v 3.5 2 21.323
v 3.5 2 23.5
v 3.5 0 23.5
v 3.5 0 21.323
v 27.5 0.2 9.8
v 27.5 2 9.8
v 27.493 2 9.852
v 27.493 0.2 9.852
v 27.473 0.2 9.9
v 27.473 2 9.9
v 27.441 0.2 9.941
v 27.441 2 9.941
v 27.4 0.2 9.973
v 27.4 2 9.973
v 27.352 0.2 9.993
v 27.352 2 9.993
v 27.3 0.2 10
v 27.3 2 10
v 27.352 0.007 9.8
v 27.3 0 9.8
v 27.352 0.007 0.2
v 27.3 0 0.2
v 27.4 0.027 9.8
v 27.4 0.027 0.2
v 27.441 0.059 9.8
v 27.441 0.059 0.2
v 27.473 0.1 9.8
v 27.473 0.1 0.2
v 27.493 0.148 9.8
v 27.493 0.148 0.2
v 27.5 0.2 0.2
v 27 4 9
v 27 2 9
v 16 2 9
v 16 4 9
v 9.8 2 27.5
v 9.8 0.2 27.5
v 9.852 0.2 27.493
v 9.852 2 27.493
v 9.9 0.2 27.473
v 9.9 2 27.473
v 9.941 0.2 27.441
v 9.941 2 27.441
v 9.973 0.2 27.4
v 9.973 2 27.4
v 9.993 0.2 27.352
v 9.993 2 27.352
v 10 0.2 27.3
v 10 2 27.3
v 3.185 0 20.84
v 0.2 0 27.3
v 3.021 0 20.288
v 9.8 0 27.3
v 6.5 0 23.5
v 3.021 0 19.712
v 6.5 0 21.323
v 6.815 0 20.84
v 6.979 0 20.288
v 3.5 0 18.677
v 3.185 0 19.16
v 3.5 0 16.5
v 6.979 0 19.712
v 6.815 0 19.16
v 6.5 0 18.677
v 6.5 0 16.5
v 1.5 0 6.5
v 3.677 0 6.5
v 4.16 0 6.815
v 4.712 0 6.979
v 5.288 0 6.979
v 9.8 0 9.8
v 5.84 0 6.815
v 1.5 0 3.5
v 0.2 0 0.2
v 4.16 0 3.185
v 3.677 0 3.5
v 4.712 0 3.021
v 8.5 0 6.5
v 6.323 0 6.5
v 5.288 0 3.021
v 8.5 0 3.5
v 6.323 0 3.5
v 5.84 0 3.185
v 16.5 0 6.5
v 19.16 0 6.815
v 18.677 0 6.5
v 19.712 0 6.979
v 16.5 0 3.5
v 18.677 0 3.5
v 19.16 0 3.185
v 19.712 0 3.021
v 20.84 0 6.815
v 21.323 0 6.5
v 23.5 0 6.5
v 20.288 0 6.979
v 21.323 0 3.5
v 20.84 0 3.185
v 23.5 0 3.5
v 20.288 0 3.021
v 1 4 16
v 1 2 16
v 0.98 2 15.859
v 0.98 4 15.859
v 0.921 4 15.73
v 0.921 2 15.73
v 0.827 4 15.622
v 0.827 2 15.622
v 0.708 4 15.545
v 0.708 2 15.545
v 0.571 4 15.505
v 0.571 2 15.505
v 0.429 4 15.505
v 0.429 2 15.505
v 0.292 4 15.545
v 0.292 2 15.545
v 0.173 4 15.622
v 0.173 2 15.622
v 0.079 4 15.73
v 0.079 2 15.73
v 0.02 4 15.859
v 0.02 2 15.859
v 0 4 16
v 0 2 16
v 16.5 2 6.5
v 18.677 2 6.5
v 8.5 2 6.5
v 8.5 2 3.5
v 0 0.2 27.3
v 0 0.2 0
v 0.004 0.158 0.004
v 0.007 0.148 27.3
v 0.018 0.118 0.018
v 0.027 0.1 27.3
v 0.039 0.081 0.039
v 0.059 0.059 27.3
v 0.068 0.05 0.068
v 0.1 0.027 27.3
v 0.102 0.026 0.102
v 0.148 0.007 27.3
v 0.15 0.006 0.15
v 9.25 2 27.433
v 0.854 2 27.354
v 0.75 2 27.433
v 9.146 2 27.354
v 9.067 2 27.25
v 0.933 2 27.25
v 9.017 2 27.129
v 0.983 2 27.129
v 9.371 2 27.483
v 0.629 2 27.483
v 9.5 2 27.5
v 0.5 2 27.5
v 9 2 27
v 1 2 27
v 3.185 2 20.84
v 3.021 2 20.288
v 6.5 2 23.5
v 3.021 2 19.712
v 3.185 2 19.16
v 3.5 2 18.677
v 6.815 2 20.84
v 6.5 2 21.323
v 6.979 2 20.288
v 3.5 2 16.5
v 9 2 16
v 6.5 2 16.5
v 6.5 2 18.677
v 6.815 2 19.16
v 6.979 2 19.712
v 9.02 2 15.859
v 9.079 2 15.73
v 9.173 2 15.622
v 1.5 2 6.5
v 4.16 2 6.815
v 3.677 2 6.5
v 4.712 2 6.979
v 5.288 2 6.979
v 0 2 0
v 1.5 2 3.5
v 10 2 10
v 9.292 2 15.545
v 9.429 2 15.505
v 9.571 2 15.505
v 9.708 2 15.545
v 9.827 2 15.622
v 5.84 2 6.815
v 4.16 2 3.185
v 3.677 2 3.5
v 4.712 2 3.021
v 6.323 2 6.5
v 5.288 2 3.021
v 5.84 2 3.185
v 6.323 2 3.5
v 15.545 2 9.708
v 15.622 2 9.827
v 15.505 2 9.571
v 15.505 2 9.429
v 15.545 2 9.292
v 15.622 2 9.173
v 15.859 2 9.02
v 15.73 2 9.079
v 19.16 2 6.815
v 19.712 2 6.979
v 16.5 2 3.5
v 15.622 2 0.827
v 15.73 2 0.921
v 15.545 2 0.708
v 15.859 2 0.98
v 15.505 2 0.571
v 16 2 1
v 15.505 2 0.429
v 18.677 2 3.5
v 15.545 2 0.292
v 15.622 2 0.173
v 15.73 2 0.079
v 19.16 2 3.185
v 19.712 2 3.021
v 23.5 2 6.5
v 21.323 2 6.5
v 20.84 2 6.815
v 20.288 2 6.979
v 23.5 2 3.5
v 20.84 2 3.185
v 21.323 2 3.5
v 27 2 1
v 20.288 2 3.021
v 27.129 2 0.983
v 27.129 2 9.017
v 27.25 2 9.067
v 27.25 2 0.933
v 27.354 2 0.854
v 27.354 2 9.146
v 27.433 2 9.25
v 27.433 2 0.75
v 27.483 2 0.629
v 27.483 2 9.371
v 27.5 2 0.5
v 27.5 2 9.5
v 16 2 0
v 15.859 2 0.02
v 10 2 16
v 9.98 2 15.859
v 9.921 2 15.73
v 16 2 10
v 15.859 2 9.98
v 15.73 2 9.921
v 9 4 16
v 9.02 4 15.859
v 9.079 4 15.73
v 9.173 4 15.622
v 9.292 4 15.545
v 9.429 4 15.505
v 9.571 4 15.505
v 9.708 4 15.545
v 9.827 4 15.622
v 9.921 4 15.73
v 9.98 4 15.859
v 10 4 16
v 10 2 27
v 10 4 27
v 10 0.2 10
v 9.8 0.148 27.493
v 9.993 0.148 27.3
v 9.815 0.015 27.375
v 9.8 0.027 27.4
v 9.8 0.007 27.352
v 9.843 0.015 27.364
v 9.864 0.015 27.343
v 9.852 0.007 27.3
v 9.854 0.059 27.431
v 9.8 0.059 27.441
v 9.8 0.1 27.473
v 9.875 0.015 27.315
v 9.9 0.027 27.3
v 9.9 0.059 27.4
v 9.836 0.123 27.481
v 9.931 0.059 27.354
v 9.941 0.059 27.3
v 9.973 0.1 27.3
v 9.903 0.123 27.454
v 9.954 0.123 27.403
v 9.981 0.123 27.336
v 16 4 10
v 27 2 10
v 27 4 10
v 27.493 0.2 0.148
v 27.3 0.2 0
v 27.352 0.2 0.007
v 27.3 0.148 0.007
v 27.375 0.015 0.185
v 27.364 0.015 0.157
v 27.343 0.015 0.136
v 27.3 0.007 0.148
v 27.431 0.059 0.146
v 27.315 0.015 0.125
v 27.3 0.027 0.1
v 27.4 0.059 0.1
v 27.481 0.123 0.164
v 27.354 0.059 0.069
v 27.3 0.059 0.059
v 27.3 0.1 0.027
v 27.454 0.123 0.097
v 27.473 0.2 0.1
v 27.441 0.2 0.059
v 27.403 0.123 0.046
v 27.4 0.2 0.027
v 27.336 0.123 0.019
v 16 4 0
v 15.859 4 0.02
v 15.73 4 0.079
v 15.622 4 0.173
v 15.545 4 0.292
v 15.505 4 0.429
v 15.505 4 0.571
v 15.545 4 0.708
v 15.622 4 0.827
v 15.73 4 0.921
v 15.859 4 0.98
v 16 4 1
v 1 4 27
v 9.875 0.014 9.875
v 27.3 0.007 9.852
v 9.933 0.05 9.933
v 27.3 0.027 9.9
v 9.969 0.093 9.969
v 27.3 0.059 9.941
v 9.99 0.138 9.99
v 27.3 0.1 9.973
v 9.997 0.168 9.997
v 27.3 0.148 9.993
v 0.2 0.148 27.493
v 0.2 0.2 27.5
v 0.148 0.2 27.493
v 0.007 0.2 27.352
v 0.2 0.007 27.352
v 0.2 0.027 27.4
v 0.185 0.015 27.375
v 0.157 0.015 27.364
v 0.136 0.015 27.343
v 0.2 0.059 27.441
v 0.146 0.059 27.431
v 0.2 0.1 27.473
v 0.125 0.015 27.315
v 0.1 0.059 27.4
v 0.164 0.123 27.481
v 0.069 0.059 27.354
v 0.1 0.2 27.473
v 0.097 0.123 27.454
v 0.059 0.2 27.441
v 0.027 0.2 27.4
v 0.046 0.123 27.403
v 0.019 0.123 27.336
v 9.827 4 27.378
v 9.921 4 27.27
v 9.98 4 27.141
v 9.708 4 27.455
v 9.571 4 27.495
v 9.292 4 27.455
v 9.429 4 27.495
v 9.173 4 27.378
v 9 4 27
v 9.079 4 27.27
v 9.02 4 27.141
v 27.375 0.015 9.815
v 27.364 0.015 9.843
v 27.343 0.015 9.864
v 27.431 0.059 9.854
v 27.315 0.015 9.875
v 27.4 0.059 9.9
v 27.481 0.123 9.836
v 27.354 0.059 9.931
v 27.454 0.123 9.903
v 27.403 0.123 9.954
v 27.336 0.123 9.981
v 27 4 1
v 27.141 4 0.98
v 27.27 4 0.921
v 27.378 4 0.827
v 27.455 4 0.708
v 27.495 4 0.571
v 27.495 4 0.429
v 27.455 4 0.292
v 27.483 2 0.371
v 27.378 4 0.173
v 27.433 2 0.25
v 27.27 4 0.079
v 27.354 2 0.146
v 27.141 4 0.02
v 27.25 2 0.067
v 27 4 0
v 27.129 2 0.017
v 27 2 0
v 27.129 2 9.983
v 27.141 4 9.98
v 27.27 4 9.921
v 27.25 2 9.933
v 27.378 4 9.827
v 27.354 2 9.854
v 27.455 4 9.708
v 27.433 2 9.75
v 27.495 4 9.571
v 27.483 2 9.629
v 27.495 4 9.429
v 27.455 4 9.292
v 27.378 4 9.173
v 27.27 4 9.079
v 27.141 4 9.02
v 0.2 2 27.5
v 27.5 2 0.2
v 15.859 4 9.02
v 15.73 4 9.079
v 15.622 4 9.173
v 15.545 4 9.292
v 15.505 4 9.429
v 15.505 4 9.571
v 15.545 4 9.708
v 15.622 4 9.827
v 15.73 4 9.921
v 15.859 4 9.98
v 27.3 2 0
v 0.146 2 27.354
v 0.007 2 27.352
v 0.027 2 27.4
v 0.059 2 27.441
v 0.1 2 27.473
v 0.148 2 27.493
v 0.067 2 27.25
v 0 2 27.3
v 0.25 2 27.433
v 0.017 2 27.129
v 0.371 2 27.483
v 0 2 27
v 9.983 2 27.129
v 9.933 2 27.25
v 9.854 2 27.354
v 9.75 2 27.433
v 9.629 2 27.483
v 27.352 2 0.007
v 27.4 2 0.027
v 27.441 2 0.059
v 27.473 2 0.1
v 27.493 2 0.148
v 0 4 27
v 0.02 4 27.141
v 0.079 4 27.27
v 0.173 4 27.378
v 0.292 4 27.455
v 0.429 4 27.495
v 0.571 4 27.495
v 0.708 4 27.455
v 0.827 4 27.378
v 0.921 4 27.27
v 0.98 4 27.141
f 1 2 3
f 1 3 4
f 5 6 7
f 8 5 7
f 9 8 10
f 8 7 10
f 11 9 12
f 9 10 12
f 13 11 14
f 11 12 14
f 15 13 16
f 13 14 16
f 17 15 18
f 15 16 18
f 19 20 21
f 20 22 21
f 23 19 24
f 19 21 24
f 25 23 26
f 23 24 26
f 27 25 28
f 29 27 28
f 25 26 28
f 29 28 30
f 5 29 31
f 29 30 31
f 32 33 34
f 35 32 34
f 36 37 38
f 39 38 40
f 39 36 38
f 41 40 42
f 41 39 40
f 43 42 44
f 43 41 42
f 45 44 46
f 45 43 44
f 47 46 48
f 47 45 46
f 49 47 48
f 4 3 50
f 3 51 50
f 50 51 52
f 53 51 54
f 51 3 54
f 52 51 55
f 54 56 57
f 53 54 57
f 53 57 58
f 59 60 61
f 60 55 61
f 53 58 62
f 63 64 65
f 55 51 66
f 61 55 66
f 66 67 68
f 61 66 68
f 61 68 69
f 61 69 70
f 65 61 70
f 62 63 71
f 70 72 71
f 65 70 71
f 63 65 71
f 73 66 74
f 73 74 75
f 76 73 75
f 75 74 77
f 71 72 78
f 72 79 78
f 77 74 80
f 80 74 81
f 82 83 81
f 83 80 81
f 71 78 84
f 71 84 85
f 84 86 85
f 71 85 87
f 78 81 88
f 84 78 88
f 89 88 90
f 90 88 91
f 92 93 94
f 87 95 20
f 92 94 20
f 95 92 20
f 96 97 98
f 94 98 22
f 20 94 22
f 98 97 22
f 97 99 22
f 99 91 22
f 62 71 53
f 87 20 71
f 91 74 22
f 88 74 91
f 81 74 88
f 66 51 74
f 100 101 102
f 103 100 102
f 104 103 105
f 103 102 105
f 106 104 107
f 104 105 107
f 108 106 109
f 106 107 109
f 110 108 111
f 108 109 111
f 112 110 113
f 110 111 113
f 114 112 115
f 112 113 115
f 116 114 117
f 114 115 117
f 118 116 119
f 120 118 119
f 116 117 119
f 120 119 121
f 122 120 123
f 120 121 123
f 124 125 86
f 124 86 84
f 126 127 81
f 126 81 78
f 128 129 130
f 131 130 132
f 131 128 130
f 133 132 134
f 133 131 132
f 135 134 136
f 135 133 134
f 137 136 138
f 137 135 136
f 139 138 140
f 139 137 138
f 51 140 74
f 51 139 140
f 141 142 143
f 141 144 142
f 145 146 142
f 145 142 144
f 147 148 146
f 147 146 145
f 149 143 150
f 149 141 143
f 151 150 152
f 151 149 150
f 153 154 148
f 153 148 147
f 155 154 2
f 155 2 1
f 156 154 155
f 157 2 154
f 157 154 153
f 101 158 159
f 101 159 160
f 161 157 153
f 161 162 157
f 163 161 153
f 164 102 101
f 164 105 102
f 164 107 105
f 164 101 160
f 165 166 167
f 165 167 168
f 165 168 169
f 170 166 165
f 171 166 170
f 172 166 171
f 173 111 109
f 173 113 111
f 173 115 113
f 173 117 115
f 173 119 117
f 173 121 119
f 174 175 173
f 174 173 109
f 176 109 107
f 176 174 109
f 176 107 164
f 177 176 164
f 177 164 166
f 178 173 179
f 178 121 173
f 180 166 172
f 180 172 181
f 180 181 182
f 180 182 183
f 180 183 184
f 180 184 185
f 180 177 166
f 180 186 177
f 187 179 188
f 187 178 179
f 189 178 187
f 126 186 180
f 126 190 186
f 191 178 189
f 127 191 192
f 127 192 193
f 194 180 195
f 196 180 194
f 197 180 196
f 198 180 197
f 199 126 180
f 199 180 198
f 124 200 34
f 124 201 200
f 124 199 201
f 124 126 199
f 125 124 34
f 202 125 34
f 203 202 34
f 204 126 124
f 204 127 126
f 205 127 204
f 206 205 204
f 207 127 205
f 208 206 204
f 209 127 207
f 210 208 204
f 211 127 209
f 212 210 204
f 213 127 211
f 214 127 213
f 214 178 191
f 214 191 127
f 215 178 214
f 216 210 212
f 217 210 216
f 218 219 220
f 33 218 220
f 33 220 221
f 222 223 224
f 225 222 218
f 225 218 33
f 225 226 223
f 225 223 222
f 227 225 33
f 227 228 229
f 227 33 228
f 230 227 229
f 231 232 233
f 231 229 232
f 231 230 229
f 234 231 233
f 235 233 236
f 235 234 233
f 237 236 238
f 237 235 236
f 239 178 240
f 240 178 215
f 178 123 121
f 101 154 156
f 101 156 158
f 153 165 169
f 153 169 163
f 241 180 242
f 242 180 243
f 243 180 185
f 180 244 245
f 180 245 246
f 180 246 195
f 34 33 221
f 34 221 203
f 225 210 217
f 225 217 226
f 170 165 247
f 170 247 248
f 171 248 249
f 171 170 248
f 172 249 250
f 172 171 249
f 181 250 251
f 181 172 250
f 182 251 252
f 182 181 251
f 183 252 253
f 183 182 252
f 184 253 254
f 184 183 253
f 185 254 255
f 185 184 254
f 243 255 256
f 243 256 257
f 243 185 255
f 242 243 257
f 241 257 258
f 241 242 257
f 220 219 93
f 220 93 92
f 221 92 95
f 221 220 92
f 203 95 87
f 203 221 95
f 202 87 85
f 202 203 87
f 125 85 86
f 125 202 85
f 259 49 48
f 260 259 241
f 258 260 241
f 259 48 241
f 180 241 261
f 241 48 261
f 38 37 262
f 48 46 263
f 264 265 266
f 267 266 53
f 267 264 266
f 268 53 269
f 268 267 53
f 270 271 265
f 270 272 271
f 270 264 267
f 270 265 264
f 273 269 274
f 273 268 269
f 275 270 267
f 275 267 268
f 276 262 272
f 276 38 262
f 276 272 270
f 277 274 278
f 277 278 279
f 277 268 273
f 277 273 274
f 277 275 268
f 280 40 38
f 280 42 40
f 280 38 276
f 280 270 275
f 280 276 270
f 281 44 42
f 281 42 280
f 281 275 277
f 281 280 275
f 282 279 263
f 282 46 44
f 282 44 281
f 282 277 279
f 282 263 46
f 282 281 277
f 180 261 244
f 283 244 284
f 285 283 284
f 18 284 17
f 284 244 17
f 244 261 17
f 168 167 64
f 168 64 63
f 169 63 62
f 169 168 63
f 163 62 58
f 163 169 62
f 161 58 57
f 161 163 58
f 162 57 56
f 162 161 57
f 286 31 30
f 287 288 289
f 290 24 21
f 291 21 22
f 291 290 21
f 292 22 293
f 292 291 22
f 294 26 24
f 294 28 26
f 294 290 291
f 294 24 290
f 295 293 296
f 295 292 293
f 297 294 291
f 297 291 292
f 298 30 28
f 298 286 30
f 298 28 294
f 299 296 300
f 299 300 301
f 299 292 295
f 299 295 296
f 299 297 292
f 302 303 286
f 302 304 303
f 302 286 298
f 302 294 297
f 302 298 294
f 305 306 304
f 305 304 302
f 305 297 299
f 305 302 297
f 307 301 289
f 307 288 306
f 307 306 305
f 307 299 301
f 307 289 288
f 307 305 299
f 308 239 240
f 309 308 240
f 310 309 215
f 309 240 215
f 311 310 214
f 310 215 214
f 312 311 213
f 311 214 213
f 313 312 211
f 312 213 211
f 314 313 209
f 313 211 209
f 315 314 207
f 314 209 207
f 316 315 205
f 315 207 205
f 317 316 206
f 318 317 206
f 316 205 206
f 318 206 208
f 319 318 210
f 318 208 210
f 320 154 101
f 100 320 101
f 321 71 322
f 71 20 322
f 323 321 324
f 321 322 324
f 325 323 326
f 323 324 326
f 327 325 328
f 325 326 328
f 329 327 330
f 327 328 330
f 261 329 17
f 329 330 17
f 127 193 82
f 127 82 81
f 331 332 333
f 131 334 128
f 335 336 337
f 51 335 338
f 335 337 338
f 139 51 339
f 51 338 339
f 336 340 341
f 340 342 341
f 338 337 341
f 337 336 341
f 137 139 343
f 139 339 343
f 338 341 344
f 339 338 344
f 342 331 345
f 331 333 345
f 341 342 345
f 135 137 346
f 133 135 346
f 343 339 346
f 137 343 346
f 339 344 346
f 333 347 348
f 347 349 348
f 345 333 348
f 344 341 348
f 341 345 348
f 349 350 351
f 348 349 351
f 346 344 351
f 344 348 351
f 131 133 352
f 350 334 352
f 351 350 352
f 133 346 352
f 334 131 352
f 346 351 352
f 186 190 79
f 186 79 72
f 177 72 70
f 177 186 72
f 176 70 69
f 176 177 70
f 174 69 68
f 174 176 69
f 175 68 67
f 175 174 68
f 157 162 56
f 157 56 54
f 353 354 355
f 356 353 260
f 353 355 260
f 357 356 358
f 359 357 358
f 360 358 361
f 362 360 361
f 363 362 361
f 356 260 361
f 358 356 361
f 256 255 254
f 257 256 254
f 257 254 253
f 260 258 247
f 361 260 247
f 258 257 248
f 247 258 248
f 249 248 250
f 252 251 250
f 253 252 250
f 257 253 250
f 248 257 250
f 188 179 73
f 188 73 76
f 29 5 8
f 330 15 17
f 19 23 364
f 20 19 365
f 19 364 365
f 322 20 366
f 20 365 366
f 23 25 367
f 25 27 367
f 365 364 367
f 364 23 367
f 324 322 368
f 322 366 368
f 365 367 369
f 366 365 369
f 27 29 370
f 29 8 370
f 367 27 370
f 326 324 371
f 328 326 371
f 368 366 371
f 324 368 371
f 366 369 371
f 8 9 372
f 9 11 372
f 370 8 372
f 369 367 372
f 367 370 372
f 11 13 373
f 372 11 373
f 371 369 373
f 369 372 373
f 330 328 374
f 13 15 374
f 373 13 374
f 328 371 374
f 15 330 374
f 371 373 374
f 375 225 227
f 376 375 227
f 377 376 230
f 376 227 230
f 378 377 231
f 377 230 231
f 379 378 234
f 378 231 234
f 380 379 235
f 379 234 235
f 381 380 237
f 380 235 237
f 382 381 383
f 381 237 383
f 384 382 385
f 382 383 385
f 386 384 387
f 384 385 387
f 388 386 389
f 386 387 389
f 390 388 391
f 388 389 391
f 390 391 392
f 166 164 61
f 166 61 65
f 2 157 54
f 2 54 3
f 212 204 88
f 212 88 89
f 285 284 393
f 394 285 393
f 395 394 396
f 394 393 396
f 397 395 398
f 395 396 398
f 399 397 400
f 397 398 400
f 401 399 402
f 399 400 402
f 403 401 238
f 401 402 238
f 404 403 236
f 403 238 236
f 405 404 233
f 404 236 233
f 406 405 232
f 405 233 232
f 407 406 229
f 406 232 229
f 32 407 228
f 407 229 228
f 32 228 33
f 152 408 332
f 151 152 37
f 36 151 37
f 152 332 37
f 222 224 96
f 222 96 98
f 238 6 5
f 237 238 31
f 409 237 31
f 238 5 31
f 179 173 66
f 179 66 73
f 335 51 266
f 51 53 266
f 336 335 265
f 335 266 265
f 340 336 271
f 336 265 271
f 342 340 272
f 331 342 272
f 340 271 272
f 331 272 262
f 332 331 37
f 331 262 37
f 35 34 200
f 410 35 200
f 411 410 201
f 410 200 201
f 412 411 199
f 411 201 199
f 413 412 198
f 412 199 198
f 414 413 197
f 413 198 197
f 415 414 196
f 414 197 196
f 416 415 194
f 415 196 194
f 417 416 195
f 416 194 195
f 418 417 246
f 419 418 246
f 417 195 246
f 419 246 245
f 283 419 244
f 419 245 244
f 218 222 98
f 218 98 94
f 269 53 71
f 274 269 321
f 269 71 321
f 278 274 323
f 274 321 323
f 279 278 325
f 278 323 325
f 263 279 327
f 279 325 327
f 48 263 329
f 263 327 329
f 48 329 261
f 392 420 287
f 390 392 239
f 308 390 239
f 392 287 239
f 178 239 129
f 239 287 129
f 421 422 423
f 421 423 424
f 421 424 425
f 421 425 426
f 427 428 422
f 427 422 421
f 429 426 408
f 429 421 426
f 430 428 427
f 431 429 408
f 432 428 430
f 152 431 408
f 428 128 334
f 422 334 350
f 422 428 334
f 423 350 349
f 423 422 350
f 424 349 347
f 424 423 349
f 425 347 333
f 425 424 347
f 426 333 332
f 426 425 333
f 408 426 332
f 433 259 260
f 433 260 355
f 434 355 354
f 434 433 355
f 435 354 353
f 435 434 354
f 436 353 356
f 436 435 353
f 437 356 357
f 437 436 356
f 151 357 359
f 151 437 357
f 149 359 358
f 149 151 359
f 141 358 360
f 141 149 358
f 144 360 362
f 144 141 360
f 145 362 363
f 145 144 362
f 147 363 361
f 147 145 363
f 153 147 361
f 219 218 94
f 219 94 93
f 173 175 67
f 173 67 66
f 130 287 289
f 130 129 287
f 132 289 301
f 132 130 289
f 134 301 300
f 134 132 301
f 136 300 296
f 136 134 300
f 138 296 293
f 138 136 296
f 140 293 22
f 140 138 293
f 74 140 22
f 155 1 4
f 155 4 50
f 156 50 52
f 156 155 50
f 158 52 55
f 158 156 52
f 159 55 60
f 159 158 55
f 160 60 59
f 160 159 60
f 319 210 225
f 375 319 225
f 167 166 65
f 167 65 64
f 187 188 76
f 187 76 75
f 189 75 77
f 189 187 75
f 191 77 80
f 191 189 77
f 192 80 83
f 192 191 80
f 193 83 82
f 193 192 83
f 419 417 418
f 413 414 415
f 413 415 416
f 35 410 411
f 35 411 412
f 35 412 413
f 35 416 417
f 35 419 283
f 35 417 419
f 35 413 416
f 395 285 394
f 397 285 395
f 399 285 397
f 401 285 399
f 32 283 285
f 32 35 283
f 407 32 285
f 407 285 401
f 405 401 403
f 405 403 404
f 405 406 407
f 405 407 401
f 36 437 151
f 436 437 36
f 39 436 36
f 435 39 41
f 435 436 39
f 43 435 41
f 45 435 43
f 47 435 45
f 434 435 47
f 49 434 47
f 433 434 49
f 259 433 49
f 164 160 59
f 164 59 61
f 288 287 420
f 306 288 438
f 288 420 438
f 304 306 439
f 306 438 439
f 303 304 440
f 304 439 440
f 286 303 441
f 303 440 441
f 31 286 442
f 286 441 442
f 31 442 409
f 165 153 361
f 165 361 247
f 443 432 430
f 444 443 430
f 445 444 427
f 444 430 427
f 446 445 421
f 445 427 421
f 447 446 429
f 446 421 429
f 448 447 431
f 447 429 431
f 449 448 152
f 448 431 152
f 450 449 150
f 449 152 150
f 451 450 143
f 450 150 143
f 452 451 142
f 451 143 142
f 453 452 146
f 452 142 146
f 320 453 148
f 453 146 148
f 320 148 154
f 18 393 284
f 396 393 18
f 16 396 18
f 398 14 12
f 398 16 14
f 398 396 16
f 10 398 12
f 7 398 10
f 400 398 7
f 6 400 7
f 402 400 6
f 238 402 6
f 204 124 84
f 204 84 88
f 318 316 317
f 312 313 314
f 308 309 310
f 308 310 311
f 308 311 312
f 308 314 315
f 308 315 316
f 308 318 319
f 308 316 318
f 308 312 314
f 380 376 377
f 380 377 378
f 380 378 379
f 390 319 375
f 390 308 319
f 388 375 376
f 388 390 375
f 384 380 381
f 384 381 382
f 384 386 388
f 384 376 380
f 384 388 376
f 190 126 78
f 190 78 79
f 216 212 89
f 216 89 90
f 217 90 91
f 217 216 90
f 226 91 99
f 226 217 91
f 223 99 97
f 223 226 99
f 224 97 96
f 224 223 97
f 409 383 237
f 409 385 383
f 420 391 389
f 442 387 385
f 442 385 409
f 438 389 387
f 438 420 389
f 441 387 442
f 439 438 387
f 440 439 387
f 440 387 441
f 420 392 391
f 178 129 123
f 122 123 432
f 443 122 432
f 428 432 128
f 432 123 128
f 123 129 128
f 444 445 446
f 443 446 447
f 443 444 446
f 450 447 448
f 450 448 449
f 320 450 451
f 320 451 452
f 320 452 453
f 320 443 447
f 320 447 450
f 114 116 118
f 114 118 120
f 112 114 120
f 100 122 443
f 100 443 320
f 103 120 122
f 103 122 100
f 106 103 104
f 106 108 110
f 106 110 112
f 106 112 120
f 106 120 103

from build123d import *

# Parameters (mm, degrees)
EXTRUDE_1_DEPTH        = 2
EXTRUDE_2_DEPTH        = 2
CUT_EXTRUDE_1_REACH    = 40.942
PATTERN_LINEAR_1_COUNT = 2
PATTERN_LINEAR_1_PITCH = 15
CUT_EXTRUDE_2_REACH    = 40.942
FILLET_1_R             = 0.2


with BuildPart() as part:
    # 草图1 → 凸台-拉伸1 (new body)
    with BuildSketch(Plane(origin=(0, 0, 0), x_dir=(1, 0, 0), z_dir=(0, 1, 0))):
        Polygon((0, 0), (0, -27.5), (10, -27.5), (10, -10), (27.5, -10), (27.5, 0), align=None)
    extrude(amount=EXTRUDE_1_DEPTH)

    # 草图2 → 凸台-拉伸2 (add)
    with BuildSketch(Plane(origin=(0, 2, 0), x_dir=(1, 0, 0), z_dir=(0, 1, 0))):
        with BuildLine():
            Line((27, 0), (16, 0))
            ThreePointArc((16, 0), (15.5, -0.5), (16, -1))
            Line((16, -1), (27, -1))
            ThreePointArc((27, -1), (27.5, -0.5), (27, 0))
        make_face()
        with BuildLine():
            Line((27, -9), (16, -9))
            ThreePointArc((16, -9), (15.5, -9.5), (16, -10))
            Line((16, -10), (27, -10))
            ThreePointArc((27, -10), (27.5, -9.5), (27, -9))
        make_face()
        with BuildLine():
            Line((1, -27), (1, -16))
            ThreePointArc((1, -16), (0.5, -15.5), (0, -16))
            Line((0, -16), (0, -27))
            ThreePointArc((0, -27), (0.5, -27.5), (1, -27))
        make_face()
        with BuildLine():
            Line((9, -27), (9, -16))
            ThreePointArc((9, -16), (9.5, -15.5), (10, -16))
            Line((10, -16), (10, -27))
            ThreePointArc((10, -27), (9.5, -27.5), (9, -27))
        make_face()
    extrude(amount=EXTRUDE_2_DEPTH)

    # 草图3 → 切除-拉伸1 (cut, up to next)
    with BuildSketch(Plane(origin=(0, 2, 0), x_dir=(1, 0, 0), z_dir=(0, 1, 0)), mode=Mode.PRIVATE) as cut_extrude_1_sk1:
        with BuildLine():
            Line((23.5, -3.5), (23.5, -6.5))
            Line((23.5, -6.5), (21.322875656, -6.5))
            ThreePointArc((21.322875656, -6.5), (20, -7), (18.677124344, -6.5))
            Line((18.677124344, -6.5), (16.5, -6.5))
            Line((16.5, -6.5), (16.5, -3.5))
            Line((16.5, -3.5), (18.677124344, -3.5))
            ThreePointArc((18.677124344, -3.5), (20, -3), (21.322875656, -3.5))
            Line((21.322875656, -3.5), (23.5, -3.5))
        make_face()
    cut_extrude_1_tool1 = extrude(cut_extrude_1_sk1.sketch, amount=-CUT_EXTRUDE_1_REACH, mode=Mode.PRIVATE) & part.part
    cut_extrude_1 = cut_extrude_1_tool1.solids().sort_by_distance((20, 2, 5))[0]
    add(cut_extrude_1, mode=Mode.SUBTRACT)

    # 阵列(线性)1: 切除-拉伸1 ×2
    with Locations(*[(-i * PATTERN_LINEAR_1_PITCH, 0, 0) for i in range(1, PATTERN_LINEAR_1_COUNT)]):
        add(cut_extrude_1, mode=Mode.SUBTRACT)

    # 草图4 → 切除-拉伸2 (cut, up to next)
    with BuildSketch(Plane(origin=(0, 2, 0), x_dir=(1, 0, 0), z_dir=(0, 1, 0)), mode=Mode.PRIVATE) as cut_extrude_2_sk1:
        with BuildLine():
            Line((6.5, -23.5), (3.5, -23.5))
            Line((3.5, -23.5), (3.5, -21.322875656))
            ThreePointArc((3.5, -21.322875656), (3, -20), (3.5, -18.677124344))
            Line((3.5, -18.677124344), (3.5, -16.5))
            Line((3.5, -16.5), (6.5, -16.5))
            Line((6.5, -16.5), (6.5, -18.677124344))
            ThreePointArc((6.5, -18.677124344), (7, -20), (6.5, -21.322875656))
            Line((6.5, -21.322875656), (6.5, -23.5))
        make_face()
    cut_extrude_2_tool1 = extrude(cut_extrude_2_sk1.sketch, amount=-CUT_EXTRUDE_2_REACH, mode=Mode.PRIVATE) & part.part
    add(cut_extrude_2_tool1.solids().sort_by_distance((5, 2, 20))[0], mode=Mode.SUBTRACT)

    # 圆角1
    fillet_1_edges = [part.edges().sort_by_distance(p)[0] for p in [
        (27.5, 1, 0),
        (27.5, 1, 10),
        (0, 1, 27.5),
        (10, 1, 27.5),
        (5, 0, 27.5),
        (27.5, 0, 5),
        (10, 0, 18.75),
        (18.75, 0, 10),
        (0, 0, 13.75),
        (13.75, 0, 0),
    ]]
    fillet(fillet_1_edges, radius=FILLET_1_R)


solid = part.part
